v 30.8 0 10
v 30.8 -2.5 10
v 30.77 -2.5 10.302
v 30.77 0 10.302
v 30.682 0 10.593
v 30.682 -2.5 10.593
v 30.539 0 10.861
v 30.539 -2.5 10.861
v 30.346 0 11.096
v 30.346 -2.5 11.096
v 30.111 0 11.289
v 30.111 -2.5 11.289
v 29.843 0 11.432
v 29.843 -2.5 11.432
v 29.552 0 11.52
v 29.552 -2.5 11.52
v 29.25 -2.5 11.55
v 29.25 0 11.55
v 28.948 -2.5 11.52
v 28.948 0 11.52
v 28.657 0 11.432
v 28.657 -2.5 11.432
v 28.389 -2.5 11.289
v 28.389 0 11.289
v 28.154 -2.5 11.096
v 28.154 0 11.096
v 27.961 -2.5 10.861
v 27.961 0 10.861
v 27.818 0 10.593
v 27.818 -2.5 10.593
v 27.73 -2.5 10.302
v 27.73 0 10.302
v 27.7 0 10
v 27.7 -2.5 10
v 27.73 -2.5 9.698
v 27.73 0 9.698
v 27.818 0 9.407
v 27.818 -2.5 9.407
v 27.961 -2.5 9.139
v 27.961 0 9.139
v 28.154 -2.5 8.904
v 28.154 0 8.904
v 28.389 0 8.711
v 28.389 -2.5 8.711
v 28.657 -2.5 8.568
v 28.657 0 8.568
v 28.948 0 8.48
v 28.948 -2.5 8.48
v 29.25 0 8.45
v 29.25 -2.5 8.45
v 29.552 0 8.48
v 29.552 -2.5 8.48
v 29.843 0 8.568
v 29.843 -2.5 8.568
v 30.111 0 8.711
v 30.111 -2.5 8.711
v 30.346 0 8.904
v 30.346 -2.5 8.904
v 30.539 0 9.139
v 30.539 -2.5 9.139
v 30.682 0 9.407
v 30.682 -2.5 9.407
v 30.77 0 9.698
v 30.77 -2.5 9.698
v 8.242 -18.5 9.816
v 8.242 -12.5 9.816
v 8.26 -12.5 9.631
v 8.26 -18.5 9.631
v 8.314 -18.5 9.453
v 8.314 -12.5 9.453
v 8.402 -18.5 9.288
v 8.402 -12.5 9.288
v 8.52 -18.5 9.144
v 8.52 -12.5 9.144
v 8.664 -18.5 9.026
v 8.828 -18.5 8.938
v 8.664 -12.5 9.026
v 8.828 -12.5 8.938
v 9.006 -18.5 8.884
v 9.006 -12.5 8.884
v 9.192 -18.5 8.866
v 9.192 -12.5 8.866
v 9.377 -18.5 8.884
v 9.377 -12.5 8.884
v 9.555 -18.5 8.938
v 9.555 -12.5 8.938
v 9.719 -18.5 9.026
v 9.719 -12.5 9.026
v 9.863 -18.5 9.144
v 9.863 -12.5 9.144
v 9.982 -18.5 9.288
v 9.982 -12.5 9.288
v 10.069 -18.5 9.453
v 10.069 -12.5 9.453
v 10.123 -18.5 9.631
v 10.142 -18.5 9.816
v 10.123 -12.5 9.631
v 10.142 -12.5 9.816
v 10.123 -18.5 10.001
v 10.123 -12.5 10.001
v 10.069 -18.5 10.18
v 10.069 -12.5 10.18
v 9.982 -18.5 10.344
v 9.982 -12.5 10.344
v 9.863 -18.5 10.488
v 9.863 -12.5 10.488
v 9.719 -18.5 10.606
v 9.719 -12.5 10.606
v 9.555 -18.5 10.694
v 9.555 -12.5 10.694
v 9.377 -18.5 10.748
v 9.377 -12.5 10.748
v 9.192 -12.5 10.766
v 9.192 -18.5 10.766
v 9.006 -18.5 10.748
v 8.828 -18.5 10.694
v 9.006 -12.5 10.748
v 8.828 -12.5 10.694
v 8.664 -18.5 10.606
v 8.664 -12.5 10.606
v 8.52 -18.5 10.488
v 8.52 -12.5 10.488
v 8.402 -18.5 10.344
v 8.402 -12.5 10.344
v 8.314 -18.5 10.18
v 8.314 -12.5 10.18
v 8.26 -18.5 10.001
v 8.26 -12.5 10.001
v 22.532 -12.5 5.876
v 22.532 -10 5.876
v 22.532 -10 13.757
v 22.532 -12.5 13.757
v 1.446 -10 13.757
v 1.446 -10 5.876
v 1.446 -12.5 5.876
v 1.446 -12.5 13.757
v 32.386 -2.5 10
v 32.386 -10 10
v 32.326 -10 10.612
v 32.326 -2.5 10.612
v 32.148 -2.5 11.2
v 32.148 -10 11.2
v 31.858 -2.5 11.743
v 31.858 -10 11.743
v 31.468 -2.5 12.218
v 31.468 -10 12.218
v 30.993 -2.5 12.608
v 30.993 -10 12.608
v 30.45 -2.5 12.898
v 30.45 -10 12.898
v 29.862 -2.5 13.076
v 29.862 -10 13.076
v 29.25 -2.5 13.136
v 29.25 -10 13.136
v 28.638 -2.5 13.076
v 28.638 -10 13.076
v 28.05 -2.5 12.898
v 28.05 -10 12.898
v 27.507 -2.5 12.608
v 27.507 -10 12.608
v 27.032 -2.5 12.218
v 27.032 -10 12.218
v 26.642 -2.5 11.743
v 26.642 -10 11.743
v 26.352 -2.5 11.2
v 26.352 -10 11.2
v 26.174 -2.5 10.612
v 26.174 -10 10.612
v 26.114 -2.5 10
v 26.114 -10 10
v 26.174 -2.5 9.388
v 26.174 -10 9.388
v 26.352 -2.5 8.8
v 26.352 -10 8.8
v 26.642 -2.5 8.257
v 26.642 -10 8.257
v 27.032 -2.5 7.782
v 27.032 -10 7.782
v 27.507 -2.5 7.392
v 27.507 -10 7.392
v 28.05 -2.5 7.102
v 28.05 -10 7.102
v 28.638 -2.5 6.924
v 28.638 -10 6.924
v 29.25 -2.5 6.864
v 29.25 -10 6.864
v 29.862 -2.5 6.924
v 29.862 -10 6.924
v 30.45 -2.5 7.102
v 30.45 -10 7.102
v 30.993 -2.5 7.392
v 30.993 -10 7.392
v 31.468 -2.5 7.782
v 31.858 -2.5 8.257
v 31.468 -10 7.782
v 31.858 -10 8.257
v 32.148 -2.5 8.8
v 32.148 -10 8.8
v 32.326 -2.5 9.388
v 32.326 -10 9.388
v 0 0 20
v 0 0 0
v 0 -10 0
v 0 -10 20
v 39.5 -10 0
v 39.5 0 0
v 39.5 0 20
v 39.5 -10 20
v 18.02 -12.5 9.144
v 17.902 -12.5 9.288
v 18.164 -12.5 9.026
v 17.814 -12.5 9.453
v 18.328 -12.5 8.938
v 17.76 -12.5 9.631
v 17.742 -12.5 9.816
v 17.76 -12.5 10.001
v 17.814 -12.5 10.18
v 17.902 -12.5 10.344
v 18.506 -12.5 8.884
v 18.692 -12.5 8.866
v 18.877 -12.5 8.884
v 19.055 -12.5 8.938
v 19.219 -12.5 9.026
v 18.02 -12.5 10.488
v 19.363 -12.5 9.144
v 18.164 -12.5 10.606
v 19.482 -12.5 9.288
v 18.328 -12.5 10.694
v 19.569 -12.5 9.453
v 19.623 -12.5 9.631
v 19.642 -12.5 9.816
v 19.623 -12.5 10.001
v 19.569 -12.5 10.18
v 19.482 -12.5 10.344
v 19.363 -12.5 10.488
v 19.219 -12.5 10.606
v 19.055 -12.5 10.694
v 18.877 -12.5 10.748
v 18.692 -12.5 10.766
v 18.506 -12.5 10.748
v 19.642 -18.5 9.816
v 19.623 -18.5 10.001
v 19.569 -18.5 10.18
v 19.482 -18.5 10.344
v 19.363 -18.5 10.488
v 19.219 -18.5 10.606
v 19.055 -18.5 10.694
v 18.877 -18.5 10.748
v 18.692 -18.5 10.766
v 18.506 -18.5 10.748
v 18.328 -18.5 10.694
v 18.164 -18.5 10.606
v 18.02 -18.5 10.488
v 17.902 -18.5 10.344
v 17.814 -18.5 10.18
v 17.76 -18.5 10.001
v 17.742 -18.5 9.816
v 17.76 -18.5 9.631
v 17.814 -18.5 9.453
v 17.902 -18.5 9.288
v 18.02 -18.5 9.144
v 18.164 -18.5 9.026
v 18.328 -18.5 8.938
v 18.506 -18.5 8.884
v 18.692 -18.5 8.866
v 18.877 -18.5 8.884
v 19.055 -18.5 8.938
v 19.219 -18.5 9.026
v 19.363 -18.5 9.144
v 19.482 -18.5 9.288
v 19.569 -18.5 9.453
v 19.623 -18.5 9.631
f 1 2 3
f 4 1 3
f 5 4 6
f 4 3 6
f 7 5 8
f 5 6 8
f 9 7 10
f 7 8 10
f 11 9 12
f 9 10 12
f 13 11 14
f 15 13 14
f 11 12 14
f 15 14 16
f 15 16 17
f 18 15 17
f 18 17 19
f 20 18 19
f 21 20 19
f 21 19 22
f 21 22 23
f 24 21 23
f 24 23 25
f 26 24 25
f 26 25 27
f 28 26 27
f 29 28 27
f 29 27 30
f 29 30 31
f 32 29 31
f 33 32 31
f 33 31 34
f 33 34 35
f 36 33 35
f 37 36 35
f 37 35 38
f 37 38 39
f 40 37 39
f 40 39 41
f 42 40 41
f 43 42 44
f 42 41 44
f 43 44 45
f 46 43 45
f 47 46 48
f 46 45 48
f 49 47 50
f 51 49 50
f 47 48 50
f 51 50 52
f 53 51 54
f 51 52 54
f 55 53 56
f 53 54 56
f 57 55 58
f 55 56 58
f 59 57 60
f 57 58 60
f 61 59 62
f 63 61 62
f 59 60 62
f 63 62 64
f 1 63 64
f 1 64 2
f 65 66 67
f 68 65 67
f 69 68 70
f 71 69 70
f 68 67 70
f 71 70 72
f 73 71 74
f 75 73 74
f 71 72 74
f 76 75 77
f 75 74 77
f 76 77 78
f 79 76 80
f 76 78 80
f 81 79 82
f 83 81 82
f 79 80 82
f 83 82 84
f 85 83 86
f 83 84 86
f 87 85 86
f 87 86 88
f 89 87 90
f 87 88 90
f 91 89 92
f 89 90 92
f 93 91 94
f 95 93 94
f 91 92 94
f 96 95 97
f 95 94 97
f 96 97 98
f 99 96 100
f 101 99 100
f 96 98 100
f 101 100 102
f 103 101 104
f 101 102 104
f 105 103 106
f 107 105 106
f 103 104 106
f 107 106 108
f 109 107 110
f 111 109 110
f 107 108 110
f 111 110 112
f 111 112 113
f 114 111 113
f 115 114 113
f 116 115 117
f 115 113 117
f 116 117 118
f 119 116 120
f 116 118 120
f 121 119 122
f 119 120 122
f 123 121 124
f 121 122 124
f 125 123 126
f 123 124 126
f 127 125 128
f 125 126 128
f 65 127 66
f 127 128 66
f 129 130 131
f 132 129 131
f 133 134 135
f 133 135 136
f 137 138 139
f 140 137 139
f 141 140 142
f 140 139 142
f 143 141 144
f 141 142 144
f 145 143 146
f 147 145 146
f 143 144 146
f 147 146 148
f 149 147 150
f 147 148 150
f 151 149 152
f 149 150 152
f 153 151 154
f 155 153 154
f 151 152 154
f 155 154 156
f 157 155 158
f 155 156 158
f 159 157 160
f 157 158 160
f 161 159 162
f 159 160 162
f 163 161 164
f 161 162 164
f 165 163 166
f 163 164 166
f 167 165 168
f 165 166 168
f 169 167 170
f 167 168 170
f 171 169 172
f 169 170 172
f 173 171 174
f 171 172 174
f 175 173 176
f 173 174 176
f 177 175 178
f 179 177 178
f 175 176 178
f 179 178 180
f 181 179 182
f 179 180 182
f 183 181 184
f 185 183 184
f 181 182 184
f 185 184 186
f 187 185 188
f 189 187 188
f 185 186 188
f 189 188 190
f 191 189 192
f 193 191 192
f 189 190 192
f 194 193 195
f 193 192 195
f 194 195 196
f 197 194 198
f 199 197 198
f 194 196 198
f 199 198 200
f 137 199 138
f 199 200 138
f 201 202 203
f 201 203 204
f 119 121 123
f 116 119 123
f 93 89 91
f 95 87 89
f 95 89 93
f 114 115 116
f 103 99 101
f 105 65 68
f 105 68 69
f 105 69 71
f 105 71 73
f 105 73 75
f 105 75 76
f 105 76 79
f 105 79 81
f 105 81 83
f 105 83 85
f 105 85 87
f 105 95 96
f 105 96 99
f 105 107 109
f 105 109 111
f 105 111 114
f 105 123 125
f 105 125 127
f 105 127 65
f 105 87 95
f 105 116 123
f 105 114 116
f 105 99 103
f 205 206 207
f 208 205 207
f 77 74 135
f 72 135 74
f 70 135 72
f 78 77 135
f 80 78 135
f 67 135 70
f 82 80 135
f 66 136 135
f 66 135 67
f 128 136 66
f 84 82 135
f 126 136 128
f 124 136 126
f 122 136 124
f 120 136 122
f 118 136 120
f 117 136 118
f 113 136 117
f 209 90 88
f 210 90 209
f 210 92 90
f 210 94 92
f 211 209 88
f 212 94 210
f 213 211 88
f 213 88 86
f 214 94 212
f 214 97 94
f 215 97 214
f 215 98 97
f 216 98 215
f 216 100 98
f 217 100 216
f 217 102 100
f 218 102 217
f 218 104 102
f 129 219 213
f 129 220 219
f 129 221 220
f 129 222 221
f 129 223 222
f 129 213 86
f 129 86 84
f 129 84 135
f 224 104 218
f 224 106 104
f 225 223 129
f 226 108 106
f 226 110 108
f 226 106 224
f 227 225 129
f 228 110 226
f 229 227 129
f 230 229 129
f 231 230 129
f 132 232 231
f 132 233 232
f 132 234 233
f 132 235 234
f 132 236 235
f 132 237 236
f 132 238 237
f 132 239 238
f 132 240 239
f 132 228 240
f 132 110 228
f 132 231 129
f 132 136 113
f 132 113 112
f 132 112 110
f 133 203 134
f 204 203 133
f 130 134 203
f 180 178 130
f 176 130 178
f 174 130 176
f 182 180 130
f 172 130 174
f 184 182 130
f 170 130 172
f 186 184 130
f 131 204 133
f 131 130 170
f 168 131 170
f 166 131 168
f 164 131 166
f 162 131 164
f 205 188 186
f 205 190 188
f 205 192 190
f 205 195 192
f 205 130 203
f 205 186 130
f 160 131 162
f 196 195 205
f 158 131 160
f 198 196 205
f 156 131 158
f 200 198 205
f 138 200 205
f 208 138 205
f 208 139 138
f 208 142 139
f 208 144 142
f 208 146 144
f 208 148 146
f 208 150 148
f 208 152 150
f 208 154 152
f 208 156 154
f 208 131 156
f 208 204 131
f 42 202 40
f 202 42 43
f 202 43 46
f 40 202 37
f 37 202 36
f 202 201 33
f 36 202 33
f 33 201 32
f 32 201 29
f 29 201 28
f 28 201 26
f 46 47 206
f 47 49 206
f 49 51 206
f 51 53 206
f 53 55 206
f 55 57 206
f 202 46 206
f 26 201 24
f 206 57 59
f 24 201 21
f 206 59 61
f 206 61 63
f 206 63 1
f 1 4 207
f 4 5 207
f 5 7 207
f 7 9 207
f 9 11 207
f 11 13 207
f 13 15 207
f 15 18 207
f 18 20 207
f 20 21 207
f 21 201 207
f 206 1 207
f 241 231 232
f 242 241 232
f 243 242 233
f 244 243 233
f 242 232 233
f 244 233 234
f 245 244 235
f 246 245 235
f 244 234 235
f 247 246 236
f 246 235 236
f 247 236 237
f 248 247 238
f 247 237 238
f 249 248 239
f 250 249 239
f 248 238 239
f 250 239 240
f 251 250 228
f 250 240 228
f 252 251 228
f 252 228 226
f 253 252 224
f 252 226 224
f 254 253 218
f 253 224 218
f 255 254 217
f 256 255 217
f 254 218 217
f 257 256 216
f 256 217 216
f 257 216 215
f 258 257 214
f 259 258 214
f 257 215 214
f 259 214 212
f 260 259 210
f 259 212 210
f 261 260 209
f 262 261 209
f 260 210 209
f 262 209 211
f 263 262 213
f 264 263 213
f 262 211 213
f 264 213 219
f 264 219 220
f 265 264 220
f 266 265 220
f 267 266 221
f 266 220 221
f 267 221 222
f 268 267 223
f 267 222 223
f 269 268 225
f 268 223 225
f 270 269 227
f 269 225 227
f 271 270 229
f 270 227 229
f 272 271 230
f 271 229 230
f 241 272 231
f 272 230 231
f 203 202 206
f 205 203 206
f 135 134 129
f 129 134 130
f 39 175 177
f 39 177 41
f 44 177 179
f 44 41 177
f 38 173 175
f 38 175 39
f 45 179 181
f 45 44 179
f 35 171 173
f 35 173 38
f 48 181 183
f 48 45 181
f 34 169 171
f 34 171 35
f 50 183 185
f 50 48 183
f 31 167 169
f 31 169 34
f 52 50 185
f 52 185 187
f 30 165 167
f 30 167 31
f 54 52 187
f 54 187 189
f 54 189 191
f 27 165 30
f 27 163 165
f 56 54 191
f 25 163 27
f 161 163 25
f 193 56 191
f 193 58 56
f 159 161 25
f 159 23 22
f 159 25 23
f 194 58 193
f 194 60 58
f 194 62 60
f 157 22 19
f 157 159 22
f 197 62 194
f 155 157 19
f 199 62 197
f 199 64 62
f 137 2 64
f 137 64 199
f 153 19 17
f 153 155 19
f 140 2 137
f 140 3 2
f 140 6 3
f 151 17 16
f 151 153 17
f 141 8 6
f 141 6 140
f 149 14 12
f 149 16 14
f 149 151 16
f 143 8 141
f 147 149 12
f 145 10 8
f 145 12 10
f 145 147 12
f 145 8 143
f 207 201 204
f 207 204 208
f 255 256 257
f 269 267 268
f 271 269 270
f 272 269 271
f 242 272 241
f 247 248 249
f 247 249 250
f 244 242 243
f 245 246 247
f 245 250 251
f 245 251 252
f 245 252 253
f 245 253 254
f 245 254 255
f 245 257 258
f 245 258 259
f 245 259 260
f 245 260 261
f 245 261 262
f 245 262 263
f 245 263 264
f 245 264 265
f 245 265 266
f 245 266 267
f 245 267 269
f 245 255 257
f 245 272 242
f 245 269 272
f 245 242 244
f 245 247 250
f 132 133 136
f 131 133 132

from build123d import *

# Parameters (mm, degrees)
F0_W     = 39.5
F0_H     = 20
F1_DEPTH = 10
F2_R     = 1.55
F3_DEPTH = 25
F4_W     = 21.086062
F4_H     = 7.881046
F5_DEPTH = 2.5
F7_DEPTH = 6
F8_R     = 3.136424
F9_DEPTH = 7.5


with BuildPart() as f1:
    # F0 (on Front) → F1 (new body)
    with BuildSketch(Plane.XZ):
        with Locations((19.75, 10)):
            Rectangle(F0_W, F0_H)
    extrude(amount=F1_DEPTH)

    # F2 (on face) → F3 (cut)
    with BuildSketch(Plane.XZ.offset(10)):
        with Locations((29.25, 10)):
            Circle(F2_R)
    extrude(amount=-F3_DEPTH, mode=Mode.SUBTRACT)

    # F4 (on face) → F5 (join)
    with BuildSketch(Plane.XZ.offset(10)):
        with Locations((11.988713, 9.816159)):
            Rectangle(F4_W, F4_H)
    extrude(amount=F5_DEPTH)

    # F6 (on face) → F7 (join)
    with BuildSketch(Plane.XZ.offset(12.5)):
        with BuildLine():
            Line((18.691611, 9.816159), (17.741611, 9.816159))
            ThreePointArc((17.741611, 9.816159), (18.691611, 8.866159), (19.641611, 9.816159))
            Line((19.641611, 9.816159), (18.691611, 9.816159))
        make_face()
        with BuildLine():
            ThreePointArc((19.641611, 9.816159), (18.691611, 10.766159), (17.741611, 9.816159))
            Line((17.741611, 9.816159), (18.691611, 9.816159))
            Line((18.691611, 9.816159), (19.641611, 9.816159))
        make_face()
        with BuildLine():
            ThreePointArc((10.141611, 9.816159), (9.191611, 10.766159), (8.241611, 9.816159))
            Line((8.241611, 9.816159), (9.191611, 9.816159))
            Line((9.191611, 9.816159), (10.141611, 9.816159))
        make_face()
        with BuildLine():
            Line((9.191611, 9.816159), (8.241611, 9.816159))
            ThreePointArc((8.241611, 9.816159), (9.191611, 8.866159), (10.141611, 9.816159))
            Line((10.141611, 9.816159), (9.191611, 9.816159))
        make_face()
    extrude(amount=F7_DEPTH)

    # F8 (on face) → F9 (cut)
    with BuildSketch(Plane.XZ.offset(10)):
        with Locations((29.25, 10)):
            Circle(F8_R)
    extrude(amount=-F9_DEPTH, mode=Mode.SUBTRACT)


solid = f1.part
